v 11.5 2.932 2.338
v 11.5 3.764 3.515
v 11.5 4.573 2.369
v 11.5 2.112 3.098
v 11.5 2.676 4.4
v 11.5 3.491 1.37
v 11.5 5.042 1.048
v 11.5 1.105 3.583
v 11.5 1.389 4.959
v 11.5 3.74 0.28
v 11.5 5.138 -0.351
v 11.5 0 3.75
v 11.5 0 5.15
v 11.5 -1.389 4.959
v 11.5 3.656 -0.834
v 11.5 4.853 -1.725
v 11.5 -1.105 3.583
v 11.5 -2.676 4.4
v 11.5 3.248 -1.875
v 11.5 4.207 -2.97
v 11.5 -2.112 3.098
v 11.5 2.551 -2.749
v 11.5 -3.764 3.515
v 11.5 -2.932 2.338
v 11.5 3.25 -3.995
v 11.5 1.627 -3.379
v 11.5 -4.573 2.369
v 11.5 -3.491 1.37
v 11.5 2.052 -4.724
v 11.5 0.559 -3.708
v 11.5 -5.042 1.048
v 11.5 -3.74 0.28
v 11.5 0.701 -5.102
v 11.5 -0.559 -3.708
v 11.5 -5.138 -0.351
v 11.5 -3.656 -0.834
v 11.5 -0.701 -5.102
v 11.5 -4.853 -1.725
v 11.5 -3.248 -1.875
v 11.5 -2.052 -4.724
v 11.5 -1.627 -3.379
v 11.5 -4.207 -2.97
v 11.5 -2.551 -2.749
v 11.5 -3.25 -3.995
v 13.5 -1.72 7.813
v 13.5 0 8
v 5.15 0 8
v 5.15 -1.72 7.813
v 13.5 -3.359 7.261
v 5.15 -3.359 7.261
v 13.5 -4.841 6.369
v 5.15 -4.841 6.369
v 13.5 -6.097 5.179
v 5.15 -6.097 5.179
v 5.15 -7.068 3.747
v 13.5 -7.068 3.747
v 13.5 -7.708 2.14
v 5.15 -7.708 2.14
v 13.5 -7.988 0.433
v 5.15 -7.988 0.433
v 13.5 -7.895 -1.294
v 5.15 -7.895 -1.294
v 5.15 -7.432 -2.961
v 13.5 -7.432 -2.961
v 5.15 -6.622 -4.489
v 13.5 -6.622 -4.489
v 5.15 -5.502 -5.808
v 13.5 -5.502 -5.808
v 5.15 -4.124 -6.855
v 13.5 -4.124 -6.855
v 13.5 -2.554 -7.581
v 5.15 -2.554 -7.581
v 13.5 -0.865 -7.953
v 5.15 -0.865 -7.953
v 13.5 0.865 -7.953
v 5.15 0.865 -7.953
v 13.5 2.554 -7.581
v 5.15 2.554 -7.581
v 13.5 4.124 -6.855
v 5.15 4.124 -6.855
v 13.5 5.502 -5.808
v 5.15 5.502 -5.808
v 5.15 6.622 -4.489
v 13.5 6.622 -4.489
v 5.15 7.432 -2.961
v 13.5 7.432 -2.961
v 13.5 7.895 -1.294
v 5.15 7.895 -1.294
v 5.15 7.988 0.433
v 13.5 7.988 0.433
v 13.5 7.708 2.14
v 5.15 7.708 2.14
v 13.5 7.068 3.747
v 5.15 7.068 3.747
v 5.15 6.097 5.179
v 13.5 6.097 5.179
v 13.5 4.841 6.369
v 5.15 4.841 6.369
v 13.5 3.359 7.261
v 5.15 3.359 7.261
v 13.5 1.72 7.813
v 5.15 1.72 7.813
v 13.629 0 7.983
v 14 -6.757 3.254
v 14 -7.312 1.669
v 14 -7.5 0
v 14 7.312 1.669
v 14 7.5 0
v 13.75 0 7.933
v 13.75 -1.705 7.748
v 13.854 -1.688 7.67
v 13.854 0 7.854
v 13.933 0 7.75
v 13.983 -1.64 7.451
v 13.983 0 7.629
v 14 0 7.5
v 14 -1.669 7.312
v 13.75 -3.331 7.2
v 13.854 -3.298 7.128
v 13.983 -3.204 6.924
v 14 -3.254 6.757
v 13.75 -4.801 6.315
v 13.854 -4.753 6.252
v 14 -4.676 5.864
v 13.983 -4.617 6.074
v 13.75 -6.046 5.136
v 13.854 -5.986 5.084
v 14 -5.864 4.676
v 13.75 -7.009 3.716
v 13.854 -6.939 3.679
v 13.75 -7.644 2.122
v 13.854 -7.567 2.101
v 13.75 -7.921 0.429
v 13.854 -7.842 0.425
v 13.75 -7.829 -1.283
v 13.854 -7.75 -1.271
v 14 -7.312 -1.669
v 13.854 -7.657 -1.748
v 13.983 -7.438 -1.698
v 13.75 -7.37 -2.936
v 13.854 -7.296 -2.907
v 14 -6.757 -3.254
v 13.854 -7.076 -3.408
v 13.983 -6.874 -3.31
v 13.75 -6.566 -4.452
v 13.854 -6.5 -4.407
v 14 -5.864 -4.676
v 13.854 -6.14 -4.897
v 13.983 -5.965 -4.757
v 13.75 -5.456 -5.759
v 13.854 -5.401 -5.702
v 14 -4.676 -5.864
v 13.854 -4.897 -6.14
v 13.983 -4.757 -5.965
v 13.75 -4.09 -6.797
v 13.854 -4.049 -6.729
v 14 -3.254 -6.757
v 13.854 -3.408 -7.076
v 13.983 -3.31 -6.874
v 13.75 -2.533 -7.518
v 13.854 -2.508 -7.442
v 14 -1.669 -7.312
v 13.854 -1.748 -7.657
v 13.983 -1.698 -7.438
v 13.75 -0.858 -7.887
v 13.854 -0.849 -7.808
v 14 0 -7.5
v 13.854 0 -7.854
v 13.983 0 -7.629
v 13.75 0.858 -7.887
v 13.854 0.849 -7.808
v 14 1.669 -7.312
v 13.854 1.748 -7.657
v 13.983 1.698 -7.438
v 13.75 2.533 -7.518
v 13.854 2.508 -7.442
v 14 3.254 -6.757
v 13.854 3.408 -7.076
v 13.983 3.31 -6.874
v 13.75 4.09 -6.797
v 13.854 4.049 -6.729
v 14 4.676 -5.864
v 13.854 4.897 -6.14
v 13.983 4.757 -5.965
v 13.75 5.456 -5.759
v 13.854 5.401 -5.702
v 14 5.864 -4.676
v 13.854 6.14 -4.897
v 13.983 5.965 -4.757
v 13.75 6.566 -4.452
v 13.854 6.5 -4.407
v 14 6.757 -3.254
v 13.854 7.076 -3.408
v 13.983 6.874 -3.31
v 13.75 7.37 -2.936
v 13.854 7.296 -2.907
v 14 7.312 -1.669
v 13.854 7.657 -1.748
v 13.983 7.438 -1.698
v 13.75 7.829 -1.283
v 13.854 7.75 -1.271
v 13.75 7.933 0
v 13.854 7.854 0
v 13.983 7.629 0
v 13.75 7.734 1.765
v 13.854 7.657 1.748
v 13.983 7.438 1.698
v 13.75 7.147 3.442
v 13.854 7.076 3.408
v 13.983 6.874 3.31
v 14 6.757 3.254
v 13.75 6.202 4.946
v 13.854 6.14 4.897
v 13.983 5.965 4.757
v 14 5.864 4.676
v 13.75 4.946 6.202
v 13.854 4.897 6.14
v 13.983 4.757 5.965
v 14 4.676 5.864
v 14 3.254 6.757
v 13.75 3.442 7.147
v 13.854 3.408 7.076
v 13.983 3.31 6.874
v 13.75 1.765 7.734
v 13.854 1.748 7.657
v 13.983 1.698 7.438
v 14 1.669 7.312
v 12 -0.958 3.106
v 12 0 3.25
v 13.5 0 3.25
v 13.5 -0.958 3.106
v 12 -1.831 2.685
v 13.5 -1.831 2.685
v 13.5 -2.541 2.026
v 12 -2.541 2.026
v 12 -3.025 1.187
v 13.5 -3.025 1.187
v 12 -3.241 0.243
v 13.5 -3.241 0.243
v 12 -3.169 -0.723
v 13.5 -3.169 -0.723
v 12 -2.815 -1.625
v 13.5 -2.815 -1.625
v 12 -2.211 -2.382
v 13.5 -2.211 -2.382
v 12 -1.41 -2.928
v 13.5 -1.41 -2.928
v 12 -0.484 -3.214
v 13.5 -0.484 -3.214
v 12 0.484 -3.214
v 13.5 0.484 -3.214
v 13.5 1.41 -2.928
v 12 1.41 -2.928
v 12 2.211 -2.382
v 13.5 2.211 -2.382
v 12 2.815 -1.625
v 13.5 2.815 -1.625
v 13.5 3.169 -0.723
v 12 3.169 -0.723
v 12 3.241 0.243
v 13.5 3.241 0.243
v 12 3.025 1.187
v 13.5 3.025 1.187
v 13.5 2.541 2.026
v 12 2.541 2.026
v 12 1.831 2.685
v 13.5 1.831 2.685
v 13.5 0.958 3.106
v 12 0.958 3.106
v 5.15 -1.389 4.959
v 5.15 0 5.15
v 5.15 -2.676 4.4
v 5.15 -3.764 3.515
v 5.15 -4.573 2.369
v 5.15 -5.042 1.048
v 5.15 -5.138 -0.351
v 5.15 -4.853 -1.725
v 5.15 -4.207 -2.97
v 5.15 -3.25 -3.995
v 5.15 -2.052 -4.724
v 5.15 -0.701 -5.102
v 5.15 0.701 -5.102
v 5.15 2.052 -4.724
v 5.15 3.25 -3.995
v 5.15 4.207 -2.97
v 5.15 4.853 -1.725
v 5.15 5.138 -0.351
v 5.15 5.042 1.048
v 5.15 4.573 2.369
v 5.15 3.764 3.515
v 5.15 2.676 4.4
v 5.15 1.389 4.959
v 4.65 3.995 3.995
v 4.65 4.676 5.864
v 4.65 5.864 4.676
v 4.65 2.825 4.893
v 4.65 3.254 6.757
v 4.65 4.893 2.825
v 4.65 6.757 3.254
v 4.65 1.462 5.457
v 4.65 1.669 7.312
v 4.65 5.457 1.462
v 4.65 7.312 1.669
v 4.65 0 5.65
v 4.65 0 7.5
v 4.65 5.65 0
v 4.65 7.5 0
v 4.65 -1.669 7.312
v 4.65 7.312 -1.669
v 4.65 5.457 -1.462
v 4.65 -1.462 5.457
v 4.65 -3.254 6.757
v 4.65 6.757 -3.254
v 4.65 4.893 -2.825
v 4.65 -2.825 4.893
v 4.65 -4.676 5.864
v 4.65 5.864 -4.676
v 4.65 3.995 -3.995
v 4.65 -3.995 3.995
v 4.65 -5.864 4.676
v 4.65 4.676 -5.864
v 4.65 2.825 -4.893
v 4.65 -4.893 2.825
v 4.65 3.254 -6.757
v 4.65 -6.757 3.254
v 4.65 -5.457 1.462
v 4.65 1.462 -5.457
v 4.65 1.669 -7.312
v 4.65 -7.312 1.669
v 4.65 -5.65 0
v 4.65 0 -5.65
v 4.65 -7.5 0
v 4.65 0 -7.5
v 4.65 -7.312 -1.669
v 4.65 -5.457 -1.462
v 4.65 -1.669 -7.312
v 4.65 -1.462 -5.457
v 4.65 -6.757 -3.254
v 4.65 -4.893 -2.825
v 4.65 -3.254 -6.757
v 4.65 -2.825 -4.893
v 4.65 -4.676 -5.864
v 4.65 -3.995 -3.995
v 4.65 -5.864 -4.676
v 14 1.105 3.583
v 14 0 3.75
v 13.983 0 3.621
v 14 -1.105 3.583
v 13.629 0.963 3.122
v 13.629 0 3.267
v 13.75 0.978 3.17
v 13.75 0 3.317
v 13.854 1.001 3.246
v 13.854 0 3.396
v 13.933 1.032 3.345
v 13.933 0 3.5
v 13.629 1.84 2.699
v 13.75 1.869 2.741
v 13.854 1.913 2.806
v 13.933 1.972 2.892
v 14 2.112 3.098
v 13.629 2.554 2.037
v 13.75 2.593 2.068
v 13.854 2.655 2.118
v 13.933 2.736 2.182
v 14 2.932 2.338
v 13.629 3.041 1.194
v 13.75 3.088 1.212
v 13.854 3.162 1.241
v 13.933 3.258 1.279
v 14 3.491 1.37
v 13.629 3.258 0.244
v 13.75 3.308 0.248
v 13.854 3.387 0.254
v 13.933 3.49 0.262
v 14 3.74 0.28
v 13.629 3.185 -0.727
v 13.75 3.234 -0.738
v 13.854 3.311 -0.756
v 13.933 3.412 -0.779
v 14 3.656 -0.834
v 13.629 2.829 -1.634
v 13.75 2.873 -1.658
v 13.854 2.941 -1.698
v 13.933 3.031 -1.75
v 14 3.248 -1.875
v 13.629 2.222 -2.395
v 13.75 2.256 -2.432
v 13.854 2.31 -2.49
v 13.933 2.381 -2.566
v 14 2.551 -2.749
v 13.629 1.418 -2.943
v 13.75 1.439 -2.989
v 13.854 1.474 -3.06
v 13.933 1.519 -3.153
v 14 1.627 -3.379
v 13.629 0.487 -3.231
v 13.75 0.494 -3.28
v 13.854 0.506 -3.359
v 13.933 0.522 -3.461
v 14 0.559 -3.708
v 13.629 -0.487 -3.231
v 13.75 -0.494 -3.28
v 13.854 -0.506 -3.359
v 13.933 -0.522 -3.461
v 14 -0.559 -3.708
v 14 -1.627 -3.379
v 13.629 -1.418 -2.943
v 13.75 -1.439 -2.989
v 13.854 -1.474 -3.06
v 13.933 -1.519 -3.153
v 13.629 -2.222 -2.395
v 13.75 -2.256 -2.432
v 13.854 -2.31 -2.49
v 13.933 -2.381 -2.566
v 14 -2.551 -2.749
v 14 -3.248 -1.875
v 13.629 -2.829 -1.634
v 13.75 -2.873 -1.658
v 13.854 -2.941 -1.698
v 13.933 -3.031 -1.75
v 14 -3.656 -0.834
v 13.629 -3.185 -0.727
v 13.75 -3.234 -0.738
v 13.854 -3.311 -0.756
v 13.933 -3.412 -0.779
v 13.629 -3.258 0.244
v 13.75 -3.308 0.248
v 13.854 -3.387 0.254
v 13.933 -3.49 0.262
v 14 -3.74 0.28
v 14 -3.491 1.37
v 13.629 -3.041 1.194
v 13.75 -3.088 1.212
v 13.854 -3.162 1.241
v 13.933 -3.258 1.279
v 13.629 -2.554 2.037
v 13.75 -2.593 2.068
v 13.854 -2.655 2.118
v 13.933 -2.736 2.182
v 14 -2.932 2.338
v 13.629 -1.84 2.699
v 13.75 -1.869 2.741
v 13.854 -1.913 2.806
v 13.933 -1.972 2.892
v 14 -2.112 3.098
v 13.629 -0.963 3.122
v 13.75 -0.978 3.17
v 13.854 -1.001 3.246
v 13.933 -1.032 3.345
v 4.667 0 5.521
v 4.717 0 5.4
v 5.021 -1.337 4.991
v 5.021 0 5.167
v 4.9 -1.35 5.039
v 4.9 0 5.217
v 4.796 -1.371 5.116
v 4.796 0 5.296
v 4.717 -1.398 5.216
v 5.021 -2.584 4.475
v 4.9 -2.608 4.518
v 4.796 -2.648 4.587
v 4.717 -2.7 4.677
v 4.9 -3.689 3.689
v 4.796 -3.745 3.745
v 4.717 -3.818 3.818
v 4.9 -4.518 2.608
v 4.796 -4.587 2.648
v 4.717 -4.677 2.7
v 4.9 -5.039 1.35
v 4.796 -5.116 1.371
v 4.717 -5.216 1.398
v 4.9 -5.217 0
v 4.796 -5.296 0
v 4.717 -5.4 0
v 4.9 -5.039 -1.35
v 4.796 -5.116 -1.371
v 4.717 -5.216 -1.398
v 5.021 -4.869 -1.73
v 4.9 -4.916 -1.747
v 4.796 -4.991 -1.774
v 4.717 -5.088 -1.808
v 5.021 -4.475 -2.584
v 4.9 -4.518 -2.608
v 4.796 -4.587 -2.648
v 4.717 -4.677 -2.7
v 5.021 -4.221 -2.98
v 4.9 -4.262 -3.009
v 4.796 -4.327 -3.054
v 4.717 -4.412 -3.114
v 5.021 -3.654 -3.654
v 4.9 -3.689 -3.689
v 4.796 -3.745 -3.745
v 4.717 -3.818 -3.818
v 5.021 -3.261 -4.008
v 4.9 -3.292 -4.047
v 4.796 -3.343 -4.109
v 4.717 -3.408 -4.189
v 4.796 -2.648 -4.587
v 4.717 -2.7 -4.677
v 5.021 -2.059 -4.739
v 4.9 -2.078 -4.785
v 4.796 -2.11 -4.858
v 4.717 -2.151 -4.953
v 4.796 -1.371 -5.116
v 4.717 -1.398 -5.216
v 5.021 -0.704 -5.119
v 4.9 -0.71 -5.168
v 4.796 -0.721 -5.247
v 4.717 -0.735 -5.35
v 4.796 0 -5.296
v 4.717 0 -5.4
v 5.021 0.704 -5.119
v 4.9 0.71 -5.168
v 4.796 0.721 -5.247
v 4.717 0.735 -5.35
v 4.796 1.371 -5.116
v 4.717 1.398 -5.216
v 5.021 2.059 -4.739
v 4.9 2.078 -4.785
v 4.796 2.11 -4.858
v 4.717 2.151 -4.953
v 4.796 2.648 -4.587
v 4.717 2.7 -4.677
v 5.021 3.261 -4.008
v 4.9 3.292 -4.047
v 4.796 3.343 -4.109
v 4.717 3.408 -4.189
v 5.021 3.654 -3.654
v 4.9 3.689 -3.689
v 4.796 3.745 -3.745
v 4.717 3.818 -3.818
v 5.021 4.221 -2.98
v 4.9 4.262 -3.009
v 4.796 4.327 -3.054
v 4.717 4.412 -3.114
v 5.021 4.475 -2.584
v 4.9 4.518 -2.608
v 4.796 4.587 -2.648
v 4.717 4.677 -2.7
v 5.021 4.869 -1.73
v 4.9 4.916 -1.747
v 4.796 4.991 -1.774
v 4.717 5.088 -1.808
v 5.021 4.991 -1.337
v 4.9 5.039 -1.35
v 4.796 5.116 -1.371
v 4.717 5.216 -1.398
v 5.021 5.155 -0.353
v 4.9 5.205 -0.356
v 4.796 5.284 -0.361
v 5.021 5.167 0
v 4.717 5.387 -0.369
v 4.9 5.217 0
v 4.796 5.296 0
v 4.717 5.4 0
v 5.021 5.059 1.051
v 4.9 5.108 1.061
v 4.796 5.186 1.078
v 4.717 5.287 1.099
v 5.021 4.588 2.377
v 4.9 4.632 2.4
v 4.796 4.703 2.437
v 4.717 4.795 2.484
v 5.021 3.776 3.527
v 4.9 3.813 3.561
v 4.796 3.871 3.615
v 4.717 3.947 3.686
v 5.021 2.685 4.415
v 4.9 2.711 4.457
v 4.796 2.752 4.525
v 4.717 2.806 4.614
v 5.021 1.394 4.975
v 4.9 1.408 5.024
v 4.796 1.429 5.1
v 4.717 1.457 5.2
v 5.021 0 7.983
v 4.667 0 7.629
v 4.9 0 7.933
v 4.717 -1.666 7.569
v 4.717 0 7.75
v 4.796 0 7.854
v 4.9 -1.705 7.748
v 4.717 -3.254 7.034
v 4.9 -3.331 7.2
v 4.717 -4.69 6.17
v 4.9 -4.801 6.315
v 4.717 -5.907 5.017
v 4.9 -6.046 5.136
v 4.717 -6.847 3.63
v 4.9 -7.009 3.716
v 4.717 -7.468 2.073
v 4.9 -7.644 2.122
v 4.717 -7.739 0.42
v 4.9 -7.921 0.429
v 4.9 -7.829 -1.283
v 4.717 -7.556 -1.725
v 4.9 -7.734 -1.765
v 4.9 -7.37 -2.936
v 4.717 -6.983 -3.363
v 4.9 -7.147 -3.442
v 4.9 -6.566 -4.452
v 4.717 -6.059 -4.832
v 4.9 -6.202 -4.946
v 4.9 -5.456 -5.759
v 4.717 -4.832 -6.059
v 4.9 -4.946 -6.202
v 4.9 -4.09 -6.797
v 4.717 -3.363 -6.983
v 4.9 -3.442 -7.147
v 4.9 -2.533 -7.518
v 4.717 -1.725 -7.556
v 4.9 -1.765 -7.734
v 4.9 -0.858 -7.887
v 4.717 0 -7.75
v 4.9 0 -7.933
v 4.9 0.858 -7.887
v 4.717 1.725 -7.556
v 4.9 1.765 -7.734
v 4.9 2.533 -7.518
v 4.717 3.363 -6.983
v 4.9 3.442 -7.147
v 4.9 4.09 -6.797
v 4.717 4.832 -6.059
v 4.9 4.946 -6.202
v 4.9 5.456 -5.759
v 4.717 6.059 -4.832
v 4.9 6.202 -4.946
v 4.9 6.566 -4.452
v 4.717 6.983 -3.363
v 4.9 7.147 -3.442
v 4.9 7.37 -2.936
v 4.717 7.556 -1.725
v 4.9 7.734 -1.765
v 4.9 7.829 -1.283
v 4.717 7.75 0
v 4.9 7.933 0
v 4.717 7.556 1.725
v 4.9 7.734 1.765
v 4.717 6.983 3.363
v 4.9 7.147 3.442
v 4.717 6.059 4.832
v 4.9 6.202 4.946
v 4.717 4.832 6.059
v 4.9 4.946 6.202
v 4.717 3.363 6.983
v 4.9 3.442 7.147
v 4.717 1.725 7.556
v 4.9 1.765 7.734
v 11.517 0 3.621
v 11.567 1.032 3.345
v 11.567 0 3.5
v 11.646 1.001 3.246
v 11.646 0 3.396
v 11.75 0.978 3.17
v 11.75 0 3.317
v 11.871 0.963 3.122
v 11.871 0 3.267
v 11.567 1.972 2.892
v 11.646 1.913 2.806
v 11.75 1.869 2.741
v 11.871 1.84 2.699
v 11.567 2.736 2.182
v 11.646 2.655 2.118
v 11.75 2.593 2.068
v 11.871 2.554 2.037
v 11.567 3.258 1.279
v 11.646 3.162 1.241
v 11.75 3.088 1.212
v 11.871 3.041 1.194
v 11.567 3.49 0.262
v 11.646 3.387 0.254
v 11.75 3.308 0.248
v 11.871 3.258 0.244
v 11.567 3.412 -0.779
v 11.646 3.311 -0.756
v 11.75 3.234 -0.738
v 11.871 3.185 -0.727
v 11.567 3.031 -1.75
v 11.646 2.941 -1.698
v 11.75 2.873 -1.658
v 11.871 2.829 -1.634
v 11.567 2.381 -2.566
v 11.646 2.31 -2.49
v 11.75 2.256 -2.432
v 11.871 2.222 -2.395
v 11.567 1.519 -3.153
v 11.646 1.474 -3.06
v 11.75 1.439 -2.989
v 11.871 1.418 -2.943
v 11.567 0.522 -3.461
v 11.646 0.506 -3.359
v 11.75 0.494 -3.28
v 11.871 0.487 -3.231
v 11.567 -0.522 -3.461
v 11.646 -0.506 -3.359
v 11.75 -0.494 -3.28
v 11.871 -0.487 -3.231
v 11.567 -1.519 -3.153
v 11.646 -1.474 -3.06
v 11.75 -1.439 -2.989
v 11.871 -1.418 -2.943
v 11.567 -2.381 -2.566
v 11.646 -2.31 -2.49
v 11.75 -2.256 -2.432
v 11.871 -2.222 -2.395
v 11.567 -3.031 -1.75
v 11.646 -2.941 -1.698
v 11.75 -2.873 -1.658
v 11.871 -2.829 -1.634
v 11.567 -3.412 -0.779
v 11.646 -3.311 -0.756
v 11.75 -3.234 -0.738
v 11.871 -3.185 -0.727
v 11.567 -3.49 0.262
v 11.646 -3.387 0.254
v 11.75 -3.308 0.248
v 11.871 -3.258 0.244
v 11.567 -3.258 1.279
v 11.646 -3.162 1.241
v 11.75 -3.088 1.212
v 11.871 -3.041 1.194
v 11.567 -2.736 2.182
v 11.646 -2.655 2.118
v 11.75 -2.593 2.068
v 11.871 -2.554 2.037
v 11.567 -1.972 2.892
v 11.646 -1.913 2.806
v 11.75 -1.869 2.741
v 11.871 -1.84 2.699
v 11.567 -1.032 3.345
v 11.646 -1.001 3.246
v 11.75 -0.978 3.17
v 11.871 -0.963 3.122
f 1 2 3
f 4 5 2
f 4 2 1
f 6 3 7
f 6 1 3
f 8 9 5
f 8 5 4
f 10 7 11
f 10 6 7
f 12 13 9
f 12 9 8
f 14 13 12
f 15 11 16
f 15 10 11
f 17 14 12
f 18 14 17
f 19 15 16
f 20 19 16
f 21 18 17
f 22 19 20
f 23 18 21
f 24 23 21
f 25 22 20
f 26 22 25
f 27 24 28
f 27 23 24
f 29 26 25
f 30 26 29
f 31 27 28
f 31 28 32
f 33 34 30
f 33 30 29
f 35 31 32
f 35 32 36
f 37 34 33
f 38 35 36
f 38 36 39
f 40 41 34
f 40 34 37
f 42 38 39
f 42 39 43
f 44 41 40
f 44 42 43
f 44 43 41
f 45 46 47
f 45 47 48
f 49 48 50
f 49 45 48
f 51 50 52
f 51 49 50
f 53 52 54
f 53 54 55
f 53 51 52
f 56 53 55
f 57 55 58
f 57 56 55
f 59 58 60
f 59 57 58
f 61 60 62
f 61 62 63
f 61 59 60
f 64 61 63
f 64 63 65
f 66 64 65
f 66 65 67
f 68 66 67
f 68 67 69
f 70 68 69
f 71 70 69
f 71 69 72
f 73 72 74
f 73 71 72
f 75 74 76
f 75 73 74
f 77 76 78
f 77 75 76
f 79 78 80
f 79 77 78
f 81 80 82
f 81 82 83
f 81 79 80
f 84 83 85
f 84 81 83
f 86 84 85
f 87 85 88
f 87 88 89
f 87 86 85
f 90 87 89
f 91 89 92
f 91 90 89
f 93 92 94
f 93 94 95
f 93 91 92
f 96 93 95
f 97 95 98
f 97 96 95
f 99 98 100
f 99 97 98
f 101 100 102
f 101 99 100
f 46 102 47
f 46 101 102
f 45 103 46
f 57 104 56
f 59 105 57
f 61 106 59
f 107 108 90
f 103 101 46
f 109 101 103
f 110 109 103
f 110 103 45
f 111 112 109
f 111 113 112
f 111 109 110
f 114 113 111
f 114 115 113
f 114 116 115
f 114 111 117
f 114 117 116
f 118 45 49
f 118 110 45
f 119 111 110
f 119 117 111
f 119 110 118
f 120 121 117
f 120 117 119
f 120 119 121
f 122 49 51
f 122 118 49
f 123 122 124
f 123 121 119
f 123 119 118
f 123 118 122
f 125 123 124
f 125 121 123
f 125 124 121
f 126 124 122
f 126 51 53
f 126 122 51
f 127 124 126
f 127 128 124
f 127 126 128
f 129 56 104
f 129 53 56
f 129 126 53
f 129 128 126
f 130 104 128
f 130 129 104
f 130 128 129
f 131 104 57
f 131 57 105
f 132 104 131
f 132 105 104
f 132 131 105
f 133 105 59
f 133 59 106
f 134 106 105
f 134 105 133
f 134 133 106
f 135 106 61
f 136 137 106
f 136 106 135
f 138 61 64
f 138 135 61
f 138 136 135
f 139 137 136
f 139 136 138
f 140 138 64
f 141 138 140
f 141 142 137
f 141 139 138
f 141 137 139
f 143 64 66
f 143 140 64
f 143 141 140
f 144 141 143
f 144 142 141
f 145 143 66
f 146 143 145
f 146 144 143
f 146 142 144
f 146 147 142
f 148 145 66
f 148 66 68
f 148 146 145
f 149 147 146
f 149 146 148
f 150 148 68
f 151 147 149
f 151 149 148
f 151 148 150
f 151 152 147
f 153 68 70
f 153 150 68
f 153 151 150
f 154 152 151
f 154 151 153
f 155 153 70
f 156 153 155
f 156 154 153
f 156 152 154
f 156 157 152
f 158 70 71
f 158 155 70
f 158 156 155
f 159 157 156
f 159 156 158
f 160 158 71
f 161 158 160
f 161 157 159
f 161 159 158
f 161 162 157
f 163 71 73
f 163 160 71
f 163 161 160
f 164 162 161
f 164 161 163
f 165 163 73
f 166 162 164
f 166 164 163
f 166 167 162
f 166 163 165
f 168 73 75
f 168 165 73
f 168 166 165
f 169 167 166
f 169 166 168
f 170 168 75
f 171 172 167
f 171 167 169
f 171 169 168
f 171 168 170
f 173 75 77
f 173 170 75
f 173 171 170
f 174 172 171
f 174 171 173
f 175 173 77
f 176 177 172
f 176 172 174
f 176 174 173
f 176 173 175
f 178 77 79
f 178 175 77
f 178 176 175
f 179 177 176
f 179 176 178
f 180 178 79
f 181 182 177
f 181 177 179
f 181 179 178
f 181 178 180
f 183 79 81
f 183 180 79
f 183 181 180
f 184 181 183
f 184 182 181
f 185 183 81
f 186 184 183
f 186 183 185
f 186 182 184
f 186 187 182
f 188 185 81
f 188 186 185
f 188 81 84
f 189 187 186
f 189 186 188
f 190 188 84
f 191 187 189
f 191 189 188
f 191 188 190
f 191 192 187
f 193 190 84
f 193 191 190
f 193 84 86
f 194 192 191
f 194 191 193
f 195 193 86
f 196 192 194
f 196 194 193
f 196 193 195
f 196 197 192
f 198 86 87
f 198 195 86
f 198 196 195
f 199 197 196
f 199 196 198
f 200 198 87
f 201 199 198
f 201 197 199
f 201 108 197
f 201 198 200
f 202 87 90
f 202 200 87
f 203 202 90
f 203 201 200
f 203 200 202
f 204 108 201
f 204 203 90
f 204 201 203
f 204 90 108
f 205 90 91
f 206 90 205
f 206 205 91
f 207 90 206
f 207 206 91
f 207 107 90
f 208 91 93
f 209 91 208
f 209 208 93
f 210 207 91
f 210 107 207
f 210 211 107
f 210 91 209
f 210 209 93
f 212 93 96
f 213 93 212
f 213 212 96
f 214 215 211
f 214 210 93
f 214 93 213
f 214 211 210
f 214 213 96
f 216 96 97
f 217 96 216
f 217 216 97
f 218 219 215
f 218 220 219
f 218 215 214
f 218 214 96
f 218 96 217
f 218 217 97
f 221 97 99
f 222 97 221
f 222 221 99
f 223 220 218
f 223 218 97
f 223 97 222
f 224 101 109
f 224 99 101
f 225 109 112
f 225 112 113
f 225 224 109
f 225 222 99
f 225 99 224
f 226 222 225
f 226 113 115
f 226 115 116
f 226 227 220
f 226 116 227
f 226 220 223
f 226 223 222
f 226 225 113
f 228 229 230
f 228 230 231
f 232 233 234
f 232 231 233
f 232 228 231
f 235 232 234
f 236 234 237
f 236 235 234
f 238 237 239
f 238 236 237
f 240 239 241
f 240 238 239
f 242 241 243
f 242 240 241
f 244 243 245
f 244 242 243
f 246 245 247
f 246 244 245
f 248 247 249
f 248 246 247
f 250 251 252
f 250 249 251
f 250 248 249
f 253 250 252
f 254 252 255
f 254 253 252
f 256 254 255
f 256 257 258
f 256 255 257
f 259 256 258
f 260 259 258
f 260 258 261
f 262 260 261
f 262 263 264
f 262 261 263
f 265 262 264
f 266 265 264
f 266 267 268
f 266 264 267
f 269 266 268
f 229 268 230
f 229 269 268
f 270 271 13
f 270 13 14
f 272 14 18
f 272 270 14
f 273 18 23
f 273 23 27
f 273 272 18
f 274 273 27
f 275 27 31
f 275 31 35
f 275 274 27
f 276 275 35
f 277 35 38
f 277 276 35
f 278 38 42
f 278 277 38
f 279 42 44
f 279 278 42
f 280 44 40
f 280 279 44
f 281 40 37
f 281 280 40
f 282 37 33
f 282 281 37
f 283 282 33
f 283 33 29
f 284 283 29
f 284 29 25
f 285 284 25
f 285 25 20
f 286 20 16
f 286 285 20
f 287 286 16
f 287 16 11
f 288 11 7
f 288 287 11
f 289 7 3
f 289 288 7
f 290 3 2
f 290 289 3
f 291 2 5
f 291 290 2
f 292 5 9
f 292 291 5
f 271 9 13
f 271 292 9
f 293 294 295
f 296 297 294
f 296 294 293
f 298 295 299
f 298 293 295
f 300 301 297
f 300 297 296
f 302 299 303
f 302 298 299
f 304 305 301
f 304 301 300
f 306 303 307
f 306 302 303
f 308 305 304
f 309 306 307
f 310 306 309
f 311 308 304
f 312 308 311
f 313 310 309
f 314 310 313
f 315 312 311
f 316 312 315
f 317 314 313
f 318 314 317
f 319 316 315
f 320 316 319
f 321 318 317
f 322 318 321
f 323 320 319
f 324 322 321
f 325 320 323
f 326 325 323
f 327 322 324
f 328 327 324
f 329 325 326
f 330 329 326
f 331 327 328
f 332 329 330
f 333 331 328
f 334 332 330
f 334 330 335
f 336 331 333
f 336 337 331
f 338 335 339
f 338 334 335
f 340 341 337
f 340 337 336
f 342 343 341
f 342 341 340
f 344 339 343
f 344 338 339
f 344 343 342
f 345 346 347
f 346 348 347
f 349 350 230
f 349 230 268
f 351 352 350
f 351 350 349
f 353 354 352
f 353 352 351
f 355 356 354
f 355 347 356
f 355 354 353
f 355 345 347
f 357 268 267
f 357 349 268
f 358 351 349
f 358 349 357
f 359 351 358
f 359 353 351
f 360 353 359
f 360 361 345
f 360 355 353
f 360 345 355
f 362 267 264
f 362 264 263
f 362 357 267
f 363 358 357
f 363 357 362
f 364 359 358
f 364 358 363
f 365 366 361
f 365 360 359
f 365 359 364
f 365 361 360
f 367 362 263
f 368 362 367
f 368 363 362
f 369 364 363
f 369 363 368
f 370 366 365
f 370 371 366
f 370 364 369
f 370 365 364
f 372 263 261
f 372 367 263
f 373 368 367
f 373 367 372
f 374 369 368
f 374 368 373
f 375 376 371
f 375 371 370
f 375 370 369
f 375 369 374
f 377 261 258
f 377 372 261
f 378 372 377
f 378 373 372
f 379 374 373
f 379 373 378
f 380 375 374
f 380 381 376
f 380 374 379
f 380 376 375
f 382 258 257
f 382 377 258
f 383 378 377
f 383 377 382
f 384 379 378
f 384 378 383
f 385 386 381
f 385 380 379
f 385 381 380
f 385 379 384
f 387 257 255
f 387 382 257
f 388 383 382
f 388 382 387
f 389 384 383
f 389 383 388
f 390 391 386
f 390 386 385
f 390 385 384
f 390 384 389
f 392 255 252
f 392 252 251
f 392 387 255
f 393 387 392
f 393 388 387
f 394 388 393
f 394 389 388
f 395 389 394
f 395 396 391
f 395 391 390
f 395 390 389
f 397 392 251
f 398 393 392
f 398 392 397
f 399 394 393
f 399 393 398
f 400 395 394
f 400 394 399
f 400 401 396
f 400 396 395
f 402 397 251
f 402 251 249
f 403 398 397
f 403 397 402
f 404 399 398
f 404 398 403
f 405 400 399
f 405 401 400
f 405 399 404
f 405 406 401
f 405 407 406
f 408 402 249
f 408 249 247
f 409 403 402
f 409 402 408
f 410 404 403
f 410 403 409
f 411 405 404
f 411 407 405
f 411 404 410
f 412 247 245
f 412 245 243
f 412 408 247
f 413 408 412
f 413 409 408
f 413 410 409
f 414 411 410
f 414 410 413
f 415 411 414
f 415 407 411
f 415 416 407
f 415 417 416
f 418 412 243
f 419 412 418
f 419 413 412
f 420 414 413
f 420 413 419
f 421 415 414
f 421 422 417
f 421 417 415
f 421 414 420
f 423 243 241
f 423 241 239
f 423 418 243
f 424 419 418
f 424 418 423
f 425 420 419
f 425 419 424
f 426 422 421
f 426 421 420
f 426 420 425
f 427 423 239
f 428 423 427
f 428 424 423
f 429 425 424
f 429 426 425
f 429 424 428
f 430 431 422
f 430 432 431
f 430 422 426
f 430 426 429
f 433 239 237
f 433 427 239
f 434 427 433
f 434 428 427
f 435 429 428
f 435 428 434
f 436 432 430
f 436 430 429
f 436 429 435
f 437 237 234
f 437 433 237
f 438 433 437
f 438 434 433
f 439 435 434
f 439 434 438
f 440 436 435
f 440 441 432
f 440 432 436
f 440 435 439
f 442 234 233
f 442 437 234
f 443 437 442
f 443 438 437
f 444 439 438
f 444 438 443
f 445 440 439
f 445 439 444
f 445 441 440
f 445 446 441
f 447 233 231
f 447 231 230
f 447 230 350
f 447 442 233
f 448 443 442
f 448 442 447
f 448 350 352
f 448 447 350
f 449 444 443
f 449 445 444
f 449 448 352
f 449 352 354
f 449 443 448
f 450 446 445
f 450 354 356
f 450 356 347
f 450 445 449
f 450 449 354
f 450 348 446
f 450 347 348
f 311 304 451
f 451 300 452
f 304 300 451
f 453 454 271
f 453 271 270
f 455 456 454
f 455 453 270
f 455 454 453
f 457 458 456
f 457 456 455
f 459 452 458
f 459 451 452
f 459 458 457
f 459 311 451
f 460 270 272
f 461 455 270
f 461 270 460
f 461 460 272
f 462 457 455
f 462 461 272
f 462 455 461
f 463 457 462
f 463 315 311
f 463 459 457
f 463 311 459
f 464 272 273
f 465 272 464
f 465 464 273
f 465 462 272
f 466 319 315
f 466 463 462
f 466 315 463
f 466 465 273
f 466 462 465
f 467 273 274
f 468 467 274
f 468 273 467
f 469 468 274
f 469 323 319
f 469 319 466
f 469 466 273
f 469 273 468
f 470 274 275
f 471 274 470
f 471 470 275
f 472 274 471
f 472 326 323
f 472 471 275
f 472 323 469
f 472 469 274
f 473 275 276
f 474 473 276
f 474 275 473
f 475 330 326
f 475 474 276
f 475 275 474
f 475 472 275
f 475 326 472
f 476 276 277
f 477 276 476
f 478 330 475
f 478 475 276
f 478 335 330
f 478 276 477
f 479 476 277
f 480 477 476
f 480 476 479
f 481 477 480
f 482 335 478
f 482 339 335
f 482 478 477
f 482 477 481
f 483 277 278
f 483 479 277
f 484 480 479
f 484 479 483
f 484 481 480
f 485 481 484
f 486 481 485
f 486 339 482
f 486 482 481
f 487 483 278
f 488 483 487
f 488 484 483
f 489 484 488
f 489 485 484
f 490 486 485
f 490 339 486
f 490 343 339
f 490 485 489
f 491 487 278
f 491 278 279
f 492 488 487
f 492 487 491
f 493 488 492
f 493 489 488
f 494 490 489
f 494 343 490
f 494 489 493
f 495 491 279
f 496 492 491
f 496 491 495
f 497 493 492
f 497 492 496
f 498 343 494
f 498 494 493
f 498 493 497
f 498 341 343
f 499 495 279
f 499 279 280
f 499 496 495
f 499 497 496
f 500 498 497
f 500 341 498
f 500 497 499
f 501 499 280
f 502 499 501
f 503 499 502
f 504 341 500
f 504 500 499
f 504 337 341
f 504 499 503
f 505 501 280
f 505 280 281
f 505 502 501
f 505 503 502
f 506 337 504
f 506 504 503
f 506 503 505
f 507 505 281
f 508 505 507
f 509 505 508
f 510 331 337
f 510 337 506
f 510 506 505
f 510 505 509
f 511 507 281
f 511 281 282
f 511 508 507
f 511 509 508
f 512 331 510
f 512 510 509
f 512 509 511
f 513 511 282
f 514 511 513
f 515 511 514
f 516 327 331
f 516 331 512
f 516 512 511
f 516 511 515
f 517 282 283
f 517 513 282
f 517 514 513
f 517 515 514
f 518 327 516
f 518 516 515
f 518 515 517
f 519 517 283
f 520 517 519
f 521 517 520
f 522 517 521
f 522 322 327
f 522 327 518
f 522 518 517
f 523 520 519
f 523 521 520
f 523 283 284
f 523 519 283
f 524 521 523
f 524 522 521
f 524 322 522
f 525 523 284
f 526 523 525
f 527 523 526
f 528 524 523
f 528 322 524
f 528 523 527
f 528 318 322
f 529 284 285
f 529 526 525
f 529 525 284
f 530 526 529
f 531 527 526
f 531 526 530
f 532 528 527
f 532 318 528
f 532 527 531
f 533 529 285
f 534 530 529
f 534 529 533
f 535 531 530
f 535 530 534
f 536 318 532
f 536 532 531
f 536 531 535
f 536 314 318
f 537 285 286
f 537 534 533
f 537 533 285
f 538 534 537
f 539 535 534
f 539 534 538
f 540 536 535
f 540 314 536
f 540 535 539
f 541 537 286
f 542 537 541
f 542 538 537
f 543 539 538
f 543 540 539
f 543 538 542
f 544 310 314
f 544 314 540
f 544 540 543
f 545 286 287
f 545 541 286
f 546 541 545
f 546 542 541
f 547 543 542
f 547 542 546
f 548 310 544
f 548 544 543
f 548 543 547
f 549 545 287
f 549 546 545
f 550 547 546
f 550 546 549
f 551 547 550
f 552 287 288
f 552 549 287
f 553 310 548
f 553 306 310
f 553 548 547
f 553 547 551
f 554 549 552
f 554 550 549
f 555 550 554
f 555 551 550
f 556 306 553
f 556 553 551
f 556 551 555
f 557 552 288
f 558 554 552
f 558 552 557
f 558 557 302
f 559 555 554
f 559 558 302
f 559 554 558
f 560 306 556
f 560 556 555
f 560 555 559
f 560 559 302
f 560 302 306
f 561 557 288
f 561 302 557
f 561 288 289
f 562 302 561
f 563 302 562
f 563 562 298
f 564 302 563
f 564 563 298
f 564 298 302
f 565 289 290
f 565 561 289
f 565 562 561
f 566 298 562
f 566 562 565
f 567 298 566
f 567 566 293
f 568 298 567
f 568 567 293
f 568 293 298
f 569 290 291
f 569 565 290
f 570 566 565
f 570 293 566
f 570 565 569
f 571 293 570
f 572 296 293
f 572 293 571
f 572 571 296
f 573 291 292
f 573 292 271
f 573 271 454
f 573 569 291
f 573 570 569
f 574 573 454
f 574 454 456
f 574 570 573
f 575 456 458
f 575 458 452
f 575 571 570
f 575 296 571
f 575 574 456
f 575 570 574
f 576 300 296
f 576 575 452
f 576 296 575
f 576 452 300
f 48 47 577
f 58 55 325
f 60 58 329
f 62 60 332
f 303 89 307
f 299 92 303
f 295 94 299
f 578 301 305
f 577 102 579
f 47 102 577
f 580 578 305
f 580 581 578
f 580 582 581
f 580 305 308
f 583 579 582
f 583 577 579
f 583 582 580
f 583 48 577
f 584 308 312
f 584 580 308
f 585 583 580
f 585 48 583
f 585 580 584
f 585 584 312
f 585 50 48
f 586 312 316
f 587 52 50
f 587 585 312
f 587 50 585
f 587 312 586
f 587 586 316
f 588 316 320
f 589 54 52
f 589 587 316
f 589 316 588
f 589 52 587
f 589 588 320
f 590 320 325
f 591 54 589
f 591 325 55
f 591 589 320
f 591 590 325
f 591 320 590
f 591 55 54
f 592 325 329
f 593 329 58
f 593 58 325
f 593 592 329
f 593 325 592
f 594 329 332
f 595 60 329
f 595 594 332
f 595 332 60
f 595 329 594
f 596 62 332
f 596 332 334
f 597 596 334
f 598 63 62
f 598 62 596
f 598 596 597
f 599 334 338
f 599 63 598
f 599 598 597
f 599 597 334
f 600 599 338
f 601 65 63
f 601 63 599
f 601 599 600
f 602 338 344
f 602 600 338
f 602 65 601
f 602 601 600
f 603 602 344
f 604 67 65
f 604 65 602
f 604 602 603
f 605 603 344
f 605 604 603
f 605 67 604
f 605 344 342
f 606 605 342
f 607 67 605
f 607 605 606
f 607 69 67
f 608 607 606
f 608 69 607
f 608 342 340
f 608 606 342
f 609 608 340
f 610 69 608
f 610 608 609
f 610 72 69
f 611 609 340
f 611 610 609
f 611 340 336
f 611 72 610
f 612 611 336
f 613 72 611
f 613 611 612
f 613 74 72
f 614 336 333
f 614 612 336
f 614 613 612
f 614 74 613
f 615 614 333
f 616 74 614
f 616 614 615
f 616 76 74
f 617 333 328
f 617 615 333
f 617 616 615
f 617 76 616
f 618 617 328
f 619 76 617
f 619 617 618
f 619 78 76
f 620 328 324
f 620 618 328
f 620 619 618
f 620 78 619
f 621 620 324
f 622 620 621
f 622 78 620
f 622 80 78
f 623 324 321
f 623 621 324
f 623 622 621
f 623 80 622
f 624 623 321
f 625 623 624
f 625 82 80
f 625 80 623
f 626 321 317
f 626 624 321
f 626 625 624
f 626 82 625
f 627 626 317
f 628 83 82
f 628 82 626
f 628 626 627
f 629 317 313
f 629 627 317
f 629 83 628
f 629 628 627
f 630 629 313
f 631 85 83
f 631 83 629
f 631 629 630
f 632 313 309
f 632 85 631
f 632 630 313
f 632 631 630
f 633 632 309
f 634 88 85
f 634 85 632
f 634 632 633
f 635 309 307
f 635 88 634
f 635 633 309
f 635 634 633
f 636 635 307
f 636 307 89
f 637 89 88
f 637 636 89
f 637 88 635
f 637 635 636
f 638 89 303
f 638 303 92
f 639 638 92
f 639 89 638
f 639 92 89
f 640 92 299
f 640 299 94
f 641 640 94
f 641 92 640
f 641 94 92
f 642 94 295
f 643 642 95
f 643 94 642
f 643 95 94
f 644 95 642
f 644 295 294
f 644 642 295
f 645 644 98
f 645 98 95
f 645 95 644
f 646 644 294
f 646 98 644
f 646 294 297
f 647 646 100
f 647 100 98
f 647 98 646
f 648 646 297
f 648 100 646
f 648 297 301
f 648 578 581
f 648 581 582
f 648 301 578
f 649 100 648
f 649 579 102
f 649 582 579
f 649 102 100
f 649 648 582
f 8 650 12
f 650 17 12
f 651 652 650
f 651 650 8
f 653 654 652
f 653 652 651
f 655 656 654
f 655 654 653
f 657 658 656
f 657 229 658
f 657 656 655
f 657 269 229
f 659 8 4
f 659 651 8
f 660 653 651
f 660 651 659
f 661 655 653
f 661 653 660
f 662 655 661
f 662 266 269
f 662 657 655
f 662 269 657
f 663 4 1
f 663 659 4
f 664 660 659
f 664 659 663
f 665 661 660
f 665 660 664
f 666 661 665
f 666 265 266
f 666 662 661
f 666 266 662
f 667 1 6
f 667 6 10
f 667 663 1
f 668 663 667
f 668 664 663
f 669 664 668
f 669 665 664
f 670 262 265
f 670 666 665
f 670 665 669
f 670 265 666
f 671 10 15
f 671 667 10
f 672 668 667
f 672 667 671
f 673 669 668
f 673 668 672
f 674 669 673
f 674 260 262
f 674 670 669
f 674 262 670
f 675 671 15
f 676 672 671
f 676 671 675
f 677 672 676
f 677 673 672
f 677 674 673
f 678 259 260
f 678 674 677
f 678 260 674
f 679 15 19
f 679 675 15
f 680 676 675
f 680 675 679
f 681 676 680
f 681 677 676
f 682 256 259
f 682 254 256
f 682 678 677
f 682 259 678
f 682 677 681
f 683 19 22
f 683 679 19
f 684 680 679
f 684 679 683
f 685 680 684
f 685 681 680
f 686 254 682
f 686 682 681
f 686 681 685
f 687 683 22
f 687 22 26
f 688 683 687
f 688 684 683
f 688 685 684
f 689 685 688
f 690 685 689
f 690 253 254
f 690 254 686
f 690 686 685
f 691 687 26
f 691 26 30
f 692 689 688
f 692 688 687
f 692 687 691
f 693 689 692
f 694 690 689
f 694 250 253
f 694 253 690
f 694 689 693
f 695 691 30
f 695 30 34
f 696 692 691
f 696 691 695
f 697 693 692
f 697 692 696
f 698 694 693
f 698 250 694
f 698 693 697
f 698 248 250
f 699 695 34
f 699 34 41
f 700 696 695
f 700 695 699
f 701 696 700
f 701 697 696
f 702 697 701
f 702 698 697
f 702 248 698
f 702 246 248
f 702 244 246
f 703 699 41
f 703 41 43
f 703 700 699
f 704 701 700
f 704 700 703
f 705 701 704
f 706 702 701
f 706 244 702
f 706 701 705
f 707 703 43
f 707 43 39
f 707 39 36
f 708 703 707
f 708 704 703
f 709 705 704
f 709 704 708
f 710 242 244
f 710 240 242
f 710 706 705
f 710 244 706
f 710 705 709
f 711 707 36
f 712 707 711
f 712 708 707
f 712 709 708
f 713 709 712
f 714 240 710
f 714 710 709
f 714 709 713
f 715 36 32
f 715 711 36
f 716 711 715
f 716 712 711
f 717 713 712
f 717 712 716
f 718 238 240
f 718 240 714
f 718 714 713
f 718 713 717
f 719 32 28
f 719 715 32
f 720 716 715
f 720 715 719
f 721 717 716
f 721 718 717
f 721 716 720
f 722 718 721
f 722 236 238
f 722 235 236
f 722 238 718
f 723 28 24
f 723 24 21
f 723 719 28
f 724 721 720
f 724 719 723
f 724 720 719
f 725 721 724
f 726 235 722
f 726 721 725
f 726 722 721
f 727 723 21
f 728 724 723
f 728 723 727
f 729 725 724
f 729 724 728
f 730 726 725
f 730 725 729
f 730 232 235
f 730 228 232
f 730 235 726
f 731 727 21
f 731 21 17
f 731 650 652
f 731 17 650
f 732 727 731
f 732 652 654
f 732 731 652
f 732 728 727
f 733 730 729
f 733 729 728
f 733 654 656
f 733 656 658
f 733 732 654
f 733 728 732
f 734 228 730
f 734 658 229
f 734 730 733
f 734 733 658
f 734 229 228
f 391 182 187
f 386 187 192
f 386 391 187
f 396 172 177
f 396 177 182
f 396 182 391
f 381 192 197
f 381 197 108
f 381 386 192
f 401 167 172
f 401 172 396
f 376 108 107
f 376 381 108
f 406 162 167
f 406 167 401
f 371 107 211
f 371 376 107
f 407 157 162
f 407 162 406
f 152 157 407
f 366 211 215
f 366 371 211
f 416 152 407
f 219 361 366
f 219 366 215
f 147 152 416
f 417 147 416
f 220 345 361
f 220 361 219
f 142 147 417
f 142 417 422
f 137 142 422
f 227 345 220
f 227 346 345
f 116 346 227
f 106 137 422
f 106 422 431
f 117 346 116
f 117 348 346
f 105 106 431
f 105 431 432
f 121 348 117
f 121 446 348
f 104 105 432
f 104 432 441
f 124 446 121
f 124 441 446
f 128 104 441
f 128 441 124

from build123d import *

# Parameters (mm, degrees)
CUT_EXTRUDE1_DEPTH      = 19
CUT_EXTRUDE1_DEPTH_BACK = 19
SKETCH2_R               = 3.25
FILLET1_R               = 0.5


with BuildPart() as part:
    # Sketch1 → Revolve1 (revolve)
    with BuildSketch(Plane.XY, mode=Mode.PRIVATE) as revolve1_sk:
        Polygon((11.5, 5.15), (4.65, 5.15), (4.65, 8), (14, 8), (14, 0), (11.5, 0), align=None)
    revolve(revolve1_sk.sketch.rotate(Axis((-1.174323487, 0, 0), (1, 0, 0)), 90), axis=Axis((-1.174323487, 0, 0), (1, 0, 0)))

    # Sketch2 → Cut-Extrude1 (cut, two sides: drawn at the far end of the back side and taken through both)
    with BuildSketch(Plane(origin=(0, 0, 0), x_dir=(0, 0, -1), z_dir=(1, 0, 0)).offset(-CUT_EXTRUDE1_DEPTH_BACK)):
        with Locations(Location((0, 0, 0), (0, 0, 180))):
            Circle(SKETCH2_R)
    extrude(amount=CUT_EXTRUDE1_DEPTH + CUT_EXTRUDE1_DEPTH_BACK, mode=Mode.SUBTRACT)

    # Fillet1
    fillet1_edges = [part.edges().sort_by_distance(p)[0] for p in [
        (11.5, 0, -3.25),
        (14, 0, -3.25),
        (4.65, 0, -5.15),
        (4.65, 0, -8),
        (14, 0, -8),
    ]]
    fillet(fillet1_edges, radius=FILLET1_R)


solid = part.part
